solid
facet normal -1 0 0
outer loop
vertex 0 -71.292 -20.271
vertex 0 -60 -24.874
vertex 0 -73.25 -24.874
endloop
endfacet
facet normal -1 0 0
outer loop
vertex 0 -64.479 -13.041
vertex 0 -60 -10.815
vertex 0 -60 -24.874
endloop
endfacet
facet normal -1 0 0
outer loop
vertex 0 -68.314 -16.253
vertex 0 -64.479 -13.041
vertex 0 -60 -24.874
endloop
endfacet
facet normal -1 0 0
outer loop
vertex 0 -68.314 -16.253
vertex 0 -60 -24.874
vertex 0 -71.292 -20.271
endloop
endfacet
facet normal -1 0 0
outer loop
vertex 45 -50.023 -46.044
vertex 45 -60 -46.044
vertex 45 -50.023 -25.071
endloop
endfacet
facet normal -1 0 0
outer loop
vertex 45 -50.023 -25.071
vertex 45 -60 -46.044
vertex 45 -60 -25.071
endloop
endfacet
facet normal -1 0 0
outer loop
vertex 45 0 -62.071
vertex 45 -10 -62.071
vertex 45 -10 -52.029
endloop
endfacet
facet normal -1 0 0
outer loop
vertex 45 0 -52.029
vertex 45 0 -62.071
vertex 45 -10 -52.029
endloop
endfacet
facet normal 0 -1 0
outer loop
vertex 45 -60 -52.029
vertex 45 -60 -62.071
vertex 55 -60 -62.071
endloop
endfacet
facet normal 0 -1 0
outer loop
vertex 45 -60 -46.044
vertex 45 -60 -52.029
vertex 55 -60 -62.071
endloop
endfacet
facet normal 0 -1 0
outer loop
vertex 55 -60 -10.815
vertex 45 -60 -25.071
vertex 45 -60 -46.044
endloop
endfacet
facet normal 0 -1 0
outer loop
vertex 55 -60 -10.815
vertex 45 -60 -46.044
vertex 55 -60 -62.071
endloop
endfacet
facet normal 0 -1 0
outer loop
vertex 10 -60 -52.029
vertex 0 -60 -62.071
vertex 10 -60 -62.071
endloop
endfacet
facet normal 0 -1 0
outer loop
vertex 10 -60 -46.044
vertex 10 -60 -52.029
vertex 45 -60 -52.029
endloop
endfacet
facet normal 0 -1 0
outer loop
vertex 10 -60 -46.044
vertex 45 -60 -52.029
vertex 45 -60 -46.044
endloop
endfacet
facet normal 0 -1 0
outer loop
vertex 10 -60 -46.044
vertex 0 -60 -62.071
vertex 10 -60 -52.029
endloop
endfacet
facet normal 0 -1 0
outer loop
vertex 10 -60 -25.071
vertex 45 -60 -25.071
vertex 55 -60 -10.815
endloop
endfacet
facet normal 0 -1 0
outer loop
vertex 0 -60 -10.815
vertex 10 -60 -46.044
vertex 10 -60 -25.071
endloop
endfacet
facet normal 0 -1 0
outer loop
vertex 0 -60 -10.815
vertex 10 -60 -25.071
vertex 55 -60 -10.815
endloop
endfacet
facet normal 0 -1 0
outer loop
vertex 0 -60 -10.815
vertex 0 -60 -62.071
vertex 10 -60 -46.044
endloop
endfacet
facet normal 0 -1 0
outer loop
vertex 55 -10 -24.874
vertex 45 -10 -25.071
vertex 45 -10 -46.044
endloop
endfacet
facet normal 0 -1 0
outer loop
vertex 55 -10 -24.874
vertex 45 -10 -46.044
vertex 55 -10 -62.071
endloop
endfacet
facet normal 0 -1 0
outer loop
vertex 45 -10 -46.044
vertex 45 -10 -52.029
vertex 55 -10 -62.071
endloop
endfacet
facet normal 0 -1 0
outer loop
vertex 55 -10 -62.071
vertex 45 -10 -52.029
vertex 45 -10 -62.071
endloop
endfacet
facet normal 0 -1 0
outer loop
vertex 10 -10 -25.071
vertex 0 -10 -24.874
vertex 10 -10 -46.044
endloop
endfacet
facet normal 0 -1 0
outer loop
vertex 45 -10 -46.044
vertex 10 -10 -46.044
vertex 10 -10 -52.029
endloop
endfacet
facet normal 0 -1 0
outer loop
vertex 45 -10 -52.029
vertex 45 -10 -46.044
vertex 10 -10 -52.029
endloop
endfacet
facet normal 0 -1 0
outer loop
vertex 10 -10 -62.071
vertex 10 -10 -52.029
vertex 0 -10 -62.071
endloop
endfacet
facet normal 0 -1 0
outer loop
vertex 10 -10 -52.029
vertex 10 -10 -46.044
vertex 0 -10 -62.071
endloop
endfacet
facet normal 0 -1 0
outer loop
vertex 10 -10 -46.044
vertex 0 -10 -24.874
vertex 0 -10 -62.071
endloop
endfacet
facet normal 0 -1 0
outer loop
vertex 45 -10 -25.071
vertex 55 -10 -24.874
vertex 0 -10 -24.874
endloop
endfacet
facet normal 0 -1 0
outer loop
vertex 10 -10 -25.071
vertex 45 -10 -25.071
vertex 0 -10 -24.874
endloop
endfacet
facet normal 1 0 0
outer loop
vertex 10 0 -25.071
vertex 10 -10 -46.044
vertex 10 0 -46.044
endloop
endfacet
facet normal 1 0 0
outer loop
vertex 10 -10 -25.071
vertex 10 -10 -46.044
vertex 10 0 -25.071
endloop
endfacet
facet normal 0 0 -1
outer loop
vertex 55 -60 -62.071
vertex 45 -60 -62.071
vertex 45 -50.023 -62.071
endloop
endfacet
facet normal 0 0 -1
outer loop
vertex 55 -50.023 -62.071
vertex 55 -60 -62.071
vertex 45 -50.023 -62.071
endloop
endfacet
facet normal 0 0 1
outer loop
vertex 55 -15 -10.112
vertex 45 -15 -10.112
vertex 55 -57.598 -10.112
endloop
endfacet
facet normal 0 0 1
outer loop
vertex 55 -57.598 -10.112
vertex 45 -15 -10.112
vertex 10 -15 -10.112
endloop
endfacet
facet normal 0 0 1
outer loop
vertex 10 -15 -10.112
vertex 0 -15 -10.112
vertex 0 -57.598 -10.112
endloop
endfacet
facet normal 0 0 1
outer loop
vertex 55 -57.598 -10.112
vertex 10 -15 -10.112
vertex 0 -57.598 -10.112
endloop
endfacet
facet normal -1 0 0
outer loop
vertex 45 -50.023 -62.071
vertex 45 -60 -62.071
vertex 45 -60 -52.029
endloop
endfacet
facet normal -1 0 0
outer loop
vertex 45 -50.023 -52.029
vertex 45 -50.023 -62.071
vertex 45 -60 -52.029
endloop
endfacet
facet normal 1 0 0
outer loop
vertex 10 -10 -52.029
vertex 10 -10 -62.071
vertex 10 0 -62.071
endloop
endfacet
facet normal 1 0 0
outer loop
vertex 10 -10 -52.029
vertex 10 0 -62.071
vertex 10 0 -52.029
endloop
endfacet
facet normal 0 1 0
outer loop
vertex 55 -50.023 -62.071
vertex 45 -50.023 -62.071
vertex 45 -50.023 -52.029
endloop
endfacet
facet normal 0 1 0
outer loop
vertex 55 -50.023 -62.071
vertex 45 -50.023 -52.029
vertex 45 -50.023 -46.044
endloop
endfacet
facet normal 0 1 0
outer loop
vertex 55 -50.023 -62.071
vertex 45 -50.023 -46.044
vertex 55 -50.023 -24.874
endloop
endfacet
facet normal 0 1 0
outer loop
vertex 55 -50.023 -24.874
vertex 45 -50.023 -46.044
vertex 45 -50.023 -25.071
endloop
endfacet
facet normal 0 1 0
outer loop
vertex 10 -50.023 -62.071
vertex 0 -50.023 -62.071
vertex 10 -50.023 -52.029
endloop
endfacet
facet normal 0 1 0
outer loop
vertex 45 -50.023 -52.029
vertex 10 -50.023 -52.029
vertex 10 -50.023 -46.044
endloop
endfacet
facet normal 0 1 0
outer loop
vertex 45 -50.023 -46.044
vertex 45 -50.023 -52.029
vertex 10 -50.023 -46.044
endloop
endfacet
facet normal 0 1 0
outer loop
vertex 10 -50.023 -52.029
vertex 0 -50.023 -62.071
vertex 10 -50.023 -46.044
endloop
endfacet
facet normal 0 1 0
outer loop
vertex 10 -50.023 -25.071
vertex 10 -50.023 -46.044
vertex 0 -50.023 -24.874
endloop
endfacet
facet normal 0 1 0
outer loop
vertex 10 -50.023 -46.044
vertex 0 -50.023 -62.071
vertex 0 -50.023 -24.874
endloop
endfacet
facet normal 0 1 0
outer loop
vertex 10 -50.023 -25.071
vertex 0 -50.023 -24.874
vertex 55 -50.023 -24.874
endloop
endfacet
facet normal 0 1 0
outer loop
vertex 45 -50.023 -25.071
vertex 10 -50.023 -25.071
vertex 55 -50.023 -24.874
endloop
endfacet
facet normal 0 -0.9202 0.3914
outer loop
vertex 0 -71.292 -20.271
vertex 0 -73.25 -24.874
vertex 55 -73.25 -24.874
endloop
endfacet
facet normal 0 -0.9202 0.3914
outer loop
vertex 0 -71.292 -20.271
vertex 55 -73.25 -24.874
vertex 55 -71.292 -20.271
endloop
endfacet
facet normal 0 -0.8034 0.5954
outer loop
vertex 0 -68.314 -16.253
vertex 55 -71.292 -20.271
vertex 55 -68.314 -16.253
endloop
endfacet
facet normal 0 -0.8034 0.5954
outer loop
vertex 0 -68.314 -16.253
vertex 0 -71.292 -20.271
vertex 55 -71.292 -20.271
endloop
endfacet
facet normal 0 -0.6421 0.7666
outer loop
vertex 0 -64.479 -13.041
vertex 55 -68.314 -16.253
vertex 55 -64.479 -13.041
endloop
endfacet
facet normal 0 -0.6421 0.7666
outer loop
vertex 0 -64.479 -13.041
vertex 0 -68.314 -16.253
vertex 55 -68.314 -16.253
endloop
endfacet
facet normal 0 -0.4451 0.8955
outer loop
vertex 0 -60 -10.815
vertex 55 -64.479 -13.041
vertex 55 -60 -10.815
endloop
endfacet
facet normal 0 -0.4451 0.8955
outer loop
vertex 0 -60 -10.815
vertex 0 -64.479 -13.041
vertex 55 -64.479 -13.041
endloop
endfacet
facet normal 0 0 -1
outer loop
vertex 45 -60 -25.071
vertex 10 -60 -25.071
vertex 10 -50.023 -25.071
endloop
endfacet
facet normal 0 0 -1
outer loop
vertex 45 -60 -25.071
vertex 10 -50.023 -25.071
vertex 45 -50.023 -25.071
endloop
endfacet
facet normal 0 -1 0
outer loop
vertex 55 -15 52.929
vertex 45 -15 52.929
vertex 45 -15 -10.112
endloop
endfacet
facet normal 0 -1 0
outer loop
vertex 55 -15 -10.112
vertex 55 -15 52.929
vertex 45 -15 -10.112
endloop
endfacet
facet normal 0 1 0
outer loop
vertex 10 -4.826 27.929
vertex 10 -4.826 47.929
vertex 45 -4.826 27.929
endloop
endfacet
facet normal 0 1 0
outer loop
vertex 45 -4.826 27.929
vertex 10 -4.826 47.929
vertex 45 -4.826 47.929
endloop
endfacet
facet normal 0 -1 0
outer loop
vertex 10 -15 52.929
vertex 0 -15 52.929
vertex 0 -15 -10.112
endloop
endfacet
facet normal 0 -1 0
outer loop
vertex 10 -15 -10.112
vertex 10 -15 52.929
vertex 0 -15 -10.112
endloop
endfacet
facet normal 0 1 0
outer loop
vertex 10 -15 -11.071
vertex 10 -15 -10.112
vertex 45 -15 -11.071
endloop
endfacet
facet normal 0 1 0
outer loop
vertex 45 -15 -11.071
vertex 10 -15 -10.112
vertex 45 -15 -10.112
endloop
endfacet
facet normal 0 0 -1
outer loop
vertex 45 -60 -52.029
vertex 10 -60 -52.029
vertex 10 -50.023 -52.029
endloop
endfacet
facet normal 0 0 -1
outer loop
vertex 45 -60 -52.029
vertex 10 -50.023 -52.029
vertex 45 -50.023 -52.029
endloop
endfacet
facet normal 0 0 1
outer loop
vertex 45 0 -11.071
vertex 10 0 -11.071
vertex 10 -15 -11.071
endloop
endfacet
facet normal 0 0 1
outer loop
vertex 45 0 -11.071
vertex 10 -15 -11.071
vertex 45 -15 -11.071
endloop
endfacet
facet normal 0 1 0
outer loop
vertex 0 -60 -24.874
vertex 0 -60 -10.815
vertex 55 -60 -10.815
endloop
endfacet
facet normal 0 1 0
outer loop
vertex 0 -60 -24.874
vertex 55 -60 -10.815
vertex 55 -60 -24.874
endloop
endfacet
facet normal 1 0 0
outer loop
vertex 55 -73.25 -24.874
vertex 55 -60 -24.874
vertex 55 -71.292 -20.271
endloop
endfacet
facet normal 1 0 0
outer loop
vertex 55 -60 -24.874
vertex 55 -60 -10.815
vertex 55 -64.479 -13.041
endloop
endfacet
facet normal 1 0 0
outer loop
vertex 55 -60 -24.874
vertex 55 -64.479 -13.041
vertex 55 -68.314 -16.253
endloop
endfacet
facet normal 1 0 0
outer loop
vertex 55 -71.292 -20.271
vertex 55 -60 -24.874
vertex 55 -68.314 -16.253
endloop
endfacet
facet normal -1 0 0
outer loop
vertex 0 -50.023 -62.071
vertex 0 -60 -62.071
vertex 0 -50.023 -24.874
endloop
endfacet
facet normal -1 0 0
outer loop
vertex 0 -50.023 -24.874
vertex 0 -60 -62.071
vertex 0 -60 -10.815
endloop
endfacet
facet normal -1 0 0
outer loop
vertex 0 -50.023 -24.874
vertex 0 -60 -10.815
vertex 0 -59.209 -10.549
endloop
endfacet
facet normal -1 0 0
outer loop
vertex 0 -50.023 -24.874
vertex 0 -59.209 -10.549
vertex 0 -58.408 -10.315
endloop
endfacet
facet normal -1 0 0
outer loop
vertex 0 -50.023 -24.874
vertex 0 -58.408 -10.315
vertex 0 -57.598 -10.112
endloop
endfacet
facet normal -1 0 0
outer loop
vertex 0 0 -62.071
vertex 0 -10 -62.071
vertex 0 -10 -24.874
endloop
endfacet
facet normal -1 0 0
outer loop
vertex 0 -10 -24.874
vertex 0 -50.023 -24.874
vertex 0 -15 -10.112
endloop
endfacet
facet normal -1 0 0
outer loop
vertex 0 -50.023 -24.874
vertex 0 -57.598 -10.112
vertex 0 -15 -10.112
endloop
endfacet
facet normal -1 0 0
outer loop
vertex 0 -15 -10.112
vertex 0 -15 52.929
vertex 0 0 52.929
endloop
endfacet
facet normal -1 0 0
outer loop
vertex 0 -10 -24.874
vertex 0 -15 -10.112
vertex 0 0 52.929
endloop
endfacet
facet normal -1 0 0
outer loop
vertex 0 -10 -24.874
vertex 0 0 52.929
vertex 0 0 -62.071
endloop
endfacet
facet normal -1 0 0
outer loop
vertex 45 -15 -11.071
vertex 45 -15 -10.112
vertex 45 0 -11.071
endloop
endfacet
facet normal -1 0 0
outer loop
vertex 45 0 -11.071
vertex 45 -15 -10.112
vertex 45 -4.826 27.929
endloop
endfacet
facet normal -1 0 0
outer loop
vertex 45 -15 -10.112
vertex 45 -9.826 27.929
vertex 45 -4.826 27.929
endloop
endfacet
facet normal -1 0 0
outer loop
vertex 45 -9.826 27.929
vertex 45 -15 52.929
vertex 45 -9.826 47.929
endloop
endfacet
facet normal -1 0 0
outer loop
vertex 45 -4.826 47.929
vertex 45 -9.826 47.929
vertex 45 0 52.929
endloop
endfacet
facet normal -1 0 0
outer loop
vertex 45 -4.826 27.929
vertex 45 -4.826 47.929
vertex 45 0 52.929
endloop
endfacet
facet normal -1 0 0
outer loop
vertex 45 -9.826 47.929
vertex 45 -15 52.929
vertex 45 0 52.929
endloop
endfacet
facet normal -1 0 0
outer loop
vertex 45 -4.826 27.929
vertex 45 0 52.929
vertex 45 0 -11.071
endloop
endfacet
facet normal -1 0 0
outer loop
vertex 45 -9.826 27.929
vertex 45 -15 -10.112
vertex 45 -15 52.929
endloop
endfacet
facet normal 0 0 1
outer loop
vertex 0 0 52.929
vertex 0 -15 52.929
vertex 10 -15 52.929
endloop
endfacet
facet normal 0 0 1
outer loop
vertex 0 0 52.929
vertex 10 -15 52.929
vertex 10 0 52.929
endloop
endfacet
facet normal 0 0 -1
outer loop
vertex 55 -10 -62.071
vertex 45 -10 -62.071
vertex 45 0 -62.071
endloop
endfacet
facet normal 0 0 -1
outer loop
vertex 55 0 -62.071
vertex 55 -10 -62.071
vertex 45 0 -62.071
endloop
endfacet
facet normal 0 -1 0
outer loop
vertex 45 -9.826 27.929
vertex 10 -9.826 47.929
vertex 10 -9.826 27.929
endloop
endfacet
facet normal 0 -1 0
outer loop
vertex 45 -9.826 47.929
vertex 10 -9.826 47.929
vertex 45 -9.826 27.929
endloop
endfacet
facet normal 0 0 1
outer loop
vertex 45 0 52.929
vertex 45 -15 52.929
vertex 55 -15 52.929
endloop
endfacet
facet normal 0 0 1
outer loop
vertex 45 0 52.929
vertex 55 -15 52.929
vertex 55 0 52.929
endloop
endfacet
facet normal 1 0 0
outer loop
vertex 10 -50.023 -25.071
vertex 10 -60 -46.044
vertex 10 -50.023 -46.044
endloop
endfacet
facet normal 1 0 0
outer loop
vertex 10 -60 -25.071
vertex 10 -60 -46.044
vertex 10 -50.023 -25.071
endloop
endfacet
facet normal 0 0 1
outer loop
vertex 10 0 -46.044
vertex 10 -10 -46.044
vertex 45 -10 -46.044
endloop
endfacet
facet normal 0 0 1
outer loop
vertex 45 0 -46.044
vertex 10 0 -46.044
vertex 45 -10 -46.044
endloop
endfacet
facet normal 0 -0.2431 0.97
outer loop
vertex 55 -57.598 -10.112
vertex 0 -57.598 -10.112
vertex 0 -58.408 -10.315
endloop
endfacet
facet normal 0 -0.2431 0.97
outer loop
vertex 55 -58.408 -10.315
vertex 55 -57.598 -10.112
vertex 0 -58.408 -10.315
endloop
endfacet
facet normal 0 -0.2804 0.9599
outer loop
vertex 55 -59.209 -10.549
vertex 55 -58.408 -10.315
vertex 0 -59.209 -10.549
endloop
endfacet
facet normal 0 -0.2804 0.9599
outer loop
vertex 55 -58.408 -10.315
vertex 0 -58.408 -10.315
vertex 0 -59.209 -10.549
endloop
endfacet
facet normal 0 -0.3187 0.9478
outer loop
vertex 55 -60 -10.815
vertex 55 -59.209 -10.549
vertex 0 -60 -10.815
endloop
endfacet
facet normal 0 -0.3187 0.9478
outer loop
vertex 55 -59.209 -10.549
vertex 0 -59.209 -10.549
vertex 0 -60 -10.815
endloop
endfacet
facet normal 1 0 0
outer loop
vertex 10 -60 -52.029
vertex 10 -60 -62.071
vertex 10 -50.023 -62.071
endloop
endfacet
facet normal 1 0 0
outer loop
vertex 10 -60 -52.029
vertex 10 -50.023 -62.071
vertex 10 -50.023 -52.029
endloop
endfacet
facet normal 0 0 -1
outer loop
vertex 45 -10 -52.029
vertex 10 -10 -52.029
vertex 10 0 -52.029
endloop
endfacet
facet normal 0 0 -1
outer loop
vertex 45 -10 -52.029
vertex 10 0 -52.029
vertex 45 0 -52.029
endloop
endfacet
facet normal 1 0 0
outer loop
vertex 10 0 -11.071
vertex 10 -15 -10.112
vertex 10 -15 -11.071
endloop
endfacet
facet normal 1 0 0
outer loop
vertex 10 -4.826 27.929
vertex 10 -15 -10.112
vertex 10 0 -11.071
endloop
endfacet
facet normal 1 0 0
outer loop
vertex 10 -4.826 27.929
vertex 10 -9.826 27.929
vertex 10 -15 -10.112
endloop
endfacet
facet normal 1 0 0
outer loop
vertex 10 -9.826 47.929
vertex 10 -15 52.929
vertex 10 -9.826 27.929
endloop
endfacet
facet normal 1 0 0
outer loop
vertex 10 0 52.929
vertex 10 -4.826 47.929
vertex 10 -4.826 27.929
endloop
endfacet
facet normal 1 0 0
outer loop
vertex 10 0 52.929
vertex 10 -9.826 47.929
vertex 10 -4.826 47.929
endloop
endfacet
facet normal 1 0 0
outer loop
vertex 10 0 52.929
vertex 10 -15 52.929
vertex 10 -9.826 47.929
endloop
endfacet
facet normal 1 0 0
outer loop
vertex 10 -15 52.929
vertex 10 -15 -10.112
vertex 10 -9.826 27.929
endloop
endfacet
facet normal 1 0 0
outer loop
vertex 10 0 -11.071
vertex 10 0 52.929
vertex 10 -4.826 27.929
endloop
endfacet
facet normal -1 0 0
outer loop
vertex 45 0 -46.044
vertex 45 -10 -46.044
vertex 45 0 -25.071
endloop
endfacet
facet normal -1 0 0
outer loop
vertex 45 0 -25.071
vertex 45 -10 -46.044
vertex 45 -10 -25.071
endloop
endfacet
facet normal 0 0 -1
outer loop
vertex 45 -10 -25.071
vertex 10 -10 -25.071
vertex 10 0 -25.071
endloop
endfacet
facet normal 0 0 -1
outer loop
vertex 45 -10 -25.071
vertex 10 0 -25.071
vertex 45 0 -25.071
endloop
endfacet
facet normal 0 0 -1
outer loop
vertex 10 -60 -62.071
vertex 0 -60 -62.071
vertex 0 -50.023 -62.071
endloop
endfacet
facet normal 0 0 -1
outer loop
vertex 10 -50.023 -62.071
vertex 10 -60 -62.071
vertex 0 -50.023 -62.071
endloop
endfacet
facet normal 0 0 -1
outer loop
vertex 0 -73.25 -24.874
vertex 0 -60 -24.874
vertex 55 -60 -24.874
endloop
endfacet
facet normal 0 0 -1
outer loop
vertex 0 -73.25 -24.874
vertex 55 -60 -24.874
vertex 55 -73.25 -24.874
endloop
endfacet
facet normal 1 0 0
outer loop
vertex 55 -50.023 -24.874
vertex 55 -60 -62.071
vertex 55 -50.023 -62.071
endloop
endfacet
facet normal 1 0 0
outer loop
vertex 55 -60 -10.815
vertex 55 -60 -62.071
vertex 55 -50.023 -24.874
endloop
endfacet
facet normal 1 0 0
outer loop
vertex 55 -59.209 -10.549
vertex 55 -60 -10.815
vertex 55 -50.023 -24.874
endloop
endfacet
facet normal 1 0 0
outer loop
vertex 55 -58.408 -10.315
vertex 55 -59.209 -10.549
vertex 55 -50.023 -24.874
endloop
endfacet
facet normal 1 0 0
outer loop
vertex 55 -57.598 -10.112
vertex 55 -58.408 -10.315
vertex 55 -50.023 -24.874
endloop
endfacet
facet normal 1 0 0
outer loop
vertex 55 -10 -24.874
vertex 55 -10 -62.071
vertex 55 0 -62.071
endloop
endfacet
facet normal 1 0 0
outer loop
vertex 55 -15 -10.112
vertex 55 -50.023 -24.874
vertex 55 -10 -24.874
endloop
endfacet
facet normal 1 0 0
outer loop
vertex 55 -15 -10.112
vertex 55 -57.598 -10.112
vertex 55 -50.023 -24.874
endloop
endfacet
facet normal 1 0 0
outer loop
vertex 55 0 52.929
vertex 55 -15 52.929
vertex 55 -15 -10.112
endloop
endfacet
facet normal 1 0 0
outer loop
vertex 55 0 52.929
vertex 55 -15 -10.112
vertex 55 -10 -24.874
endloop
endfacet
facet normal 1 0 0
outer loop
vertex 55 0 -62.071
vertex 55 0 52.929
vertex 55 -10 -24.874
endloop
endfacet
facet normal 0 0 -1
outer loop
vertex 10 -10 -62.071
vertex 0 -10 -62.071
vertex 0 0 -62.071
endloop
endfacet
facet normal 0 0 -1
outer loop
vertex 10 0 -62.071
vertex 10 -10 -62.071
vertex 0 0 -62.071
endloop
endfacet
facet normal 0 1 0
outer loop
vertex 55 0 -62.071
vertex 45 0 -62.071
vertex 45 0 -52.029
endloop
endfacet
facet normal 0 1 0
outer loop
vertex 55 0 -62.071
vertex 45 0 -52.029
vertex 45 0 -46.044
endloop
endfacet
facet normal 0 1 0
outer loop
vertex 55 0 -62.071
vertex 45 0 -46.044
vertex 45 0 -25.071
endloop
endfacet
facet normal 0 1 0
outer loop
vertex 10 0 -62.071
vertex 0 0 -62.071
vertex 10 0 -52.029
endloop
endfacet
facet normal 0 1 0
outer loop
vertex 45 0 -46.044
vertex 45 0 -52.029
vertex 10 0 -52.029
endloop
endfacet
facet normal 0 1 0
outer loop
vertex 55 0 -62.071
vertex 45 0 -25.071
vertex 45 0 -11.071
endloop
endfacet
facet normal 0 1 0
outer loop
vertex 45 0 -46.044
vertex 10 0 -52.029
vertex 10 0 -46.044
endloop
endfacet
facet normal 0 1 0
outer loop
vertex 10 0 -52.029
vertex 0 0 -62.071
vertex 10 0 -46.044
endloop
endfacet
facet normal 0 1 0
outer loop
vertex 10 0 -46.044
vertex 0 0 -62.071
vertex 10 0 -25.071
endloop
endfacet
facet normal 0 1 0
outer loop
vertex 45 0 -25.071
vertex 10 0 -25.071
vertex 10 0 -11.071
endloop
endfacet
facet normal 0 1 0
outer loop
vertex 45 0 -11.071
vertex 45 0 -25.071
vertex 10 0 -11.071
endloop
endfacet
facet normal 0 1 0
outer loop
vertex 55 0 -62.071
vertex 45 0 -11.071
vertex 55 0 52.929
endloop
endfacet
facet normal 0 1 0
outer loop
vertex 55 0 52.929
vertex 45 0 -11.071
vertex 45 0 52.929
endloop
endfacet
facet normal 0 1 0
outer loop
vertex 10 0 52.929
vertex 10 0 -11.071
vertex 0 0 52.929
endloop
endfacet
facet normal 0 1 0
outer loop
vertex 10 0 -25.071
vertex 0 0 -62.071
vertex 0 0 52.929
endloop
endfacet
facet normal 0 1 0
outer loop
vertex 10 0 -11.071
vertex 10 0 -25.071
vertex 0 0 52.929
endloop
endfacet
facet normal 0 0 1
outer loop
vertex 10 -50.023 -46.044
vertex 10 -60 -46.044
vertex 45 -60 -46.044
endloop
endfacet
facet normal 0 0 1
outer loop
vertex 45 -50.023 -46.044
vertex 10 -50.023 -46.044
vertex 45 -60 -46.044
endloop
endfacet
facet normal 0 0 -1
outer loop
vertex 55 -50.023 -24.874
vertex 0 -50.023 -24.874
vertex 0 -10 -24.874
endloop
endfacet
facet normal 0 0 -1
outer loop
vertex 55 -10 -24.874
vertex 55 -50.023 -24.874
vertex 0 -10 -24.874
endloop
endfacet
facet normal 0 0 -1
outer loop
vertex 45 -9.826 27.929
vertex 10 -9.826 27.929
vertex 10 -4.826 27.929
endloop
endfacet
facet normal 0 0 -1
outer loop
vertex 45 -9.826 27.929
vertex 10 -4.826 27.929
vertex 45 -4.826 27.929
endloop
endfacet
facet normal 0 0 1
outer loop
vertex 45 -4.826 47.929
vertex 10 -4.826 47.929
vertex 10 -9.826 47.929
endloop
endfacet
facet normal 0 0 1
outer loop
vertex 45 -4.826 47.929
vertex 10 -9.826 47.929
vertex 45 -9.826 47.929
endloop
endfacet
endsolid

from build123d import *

# Parameters (mm, degrees)
F0_W      = 60
F0_H      = 115
F1_DEPTH  = 55
F2_W      = 35
F2_H      = 10.0414325121
F3_DEPTH  = 90
F2_H_2    = 20.9734155115
F4_DEPTH  = 96
F7_DEPTH  = 55
F9_DEPTH  = 95
F10_W     = 35
F10_H     = 15
F11_DEPTH = 5
F12_W     = 35
F12_H     = 4.8255780712
F12_H_2   = 5.1744219288
F13_DEPTH = 59
F14_W     = 35
F14_H     = 39
F15_DEPTH = 25
F17_DEPTH = 95


with BuildPart() as f1:
    # F0 (on Right) → F1 (new body)
    with BuildSketch(Plane.YZ):
        with Locations((-30, -4.5705132011)):
            Rectangle(F0_W, F0_H)
    extrude(amount=F1_DEPTH)

    # F2 (on face) → F3 (cut)
    with BuildSketch(Plane.XZ.offset(60)):
        with Locations((27.5, -57.049796945)):
            Rectangle(F2_W, F2_H)
    extrude(amount=-F3_DEPTH, mode=Mode.SUBTRACT)

    # F2 (on face) → F4 (cut)
    with BuildSketch(Plane.XZ.offset(60)):
        with Locations((27.5, -35.5572209568)):
            Rectangle(F2_W, F2_H_2)
    extrude(amount=-F4_DEPTH, mode=Mode.SUBTRACT)

    # F8 (on face) → F9 (cut)
    with BuildSketch(Plane(origin=(0, 0, 0), x_dir=(0, -1, 0), z_dir=(-1, 0, 0))):
        with BuildLine():
            Line((15, 52.9294867989), (15, -10.1117771119))
            Line((15, -10.1117771119), (57.598117739, -10.1117771119))
            ThreePointArc((57.598117739, -10.1117771119), (58.8094054709, -10.4277742826), (60, -10.8145000884))
            Line((60, -10.8145000884), (60, 52.9294867989))
            Line((60, 52.9294867989), (15, 52.9294867989))
        make_face()
    extrude(amount=-F9_DEPTH, mode=Mode.SUBTRACT)

    # F10 (on face) → F11 (cut)
    with BuildSketch(Plane.XY.offset(52.9294867989)):
        with Locations((27.5, -7.5)):
            Rectangle(F10_W, F10_H)
    extrude(amount=-F11_DEPTH, mode=Mode.SUBTRACT)

    # F12 (on face) → F13 (cut)
    with BuildSketch(Plane.XY.offset(47.9294867989)):
        with Locations((27.5, -2.4127890356)):
            Rectangle(F12_W, F12_H)
        with Locations((27.5, -12.4127890356)):
            Rectangle(F12_W, F12_H_2)
    extrude(amount=-F13_DEPTH, mode=Mode.SUBTRACT)

    # F14 (on face) → F15 (cut)
    with BuildSketch(Plane.XZ.offset(9.8255780712)):
        with Locations((27.5, 8.4294867989)):
            Rectangle(F14_W, F14_H)
    extrude(amount=-F15_DEPTH, mode=Mode.SUBTRACT)

    # F16 (on face) → F17 (cut)
    with BuildSketch(Plane(origin=(0, 0, 0), x_dir=(0, -1, 0), z_dir=(-1, 0, 0))):
        Polygon((50.0226652549, -62.0705132011), (50.0226652549, -45.8980772977), (50.0226652549, -24.8737987131), (10, -24.8737987131), (10, -45.8980772977), (10, -62.0705132011), align=None)
    extrude(amount=-F17_DEPTH, mode=Mode.SUBTRACT)


with BuildPart() as f7:
    # F6 (on face) → F7 (new body)
    with BuildSketch(Plane(origin=(0, 0, 0), x_dir=(0, -1, 0), z_dir=(-1, 0, 0))):
        with BuildLine():
            ThreePointArc((73.2497498393, -24.8737987131), (68.3136194252, -16.25264453), (60, -10.8145000884))
            Line((60, -10.8145000884), (60, -24.8737987131))
            Line((60, -24.8737987131), (73.2497498393, -24.8737987131))
        make_face()
    extrude(amount=-F7_DEPTH)


solid = Compound([f1.part, f7.part])
